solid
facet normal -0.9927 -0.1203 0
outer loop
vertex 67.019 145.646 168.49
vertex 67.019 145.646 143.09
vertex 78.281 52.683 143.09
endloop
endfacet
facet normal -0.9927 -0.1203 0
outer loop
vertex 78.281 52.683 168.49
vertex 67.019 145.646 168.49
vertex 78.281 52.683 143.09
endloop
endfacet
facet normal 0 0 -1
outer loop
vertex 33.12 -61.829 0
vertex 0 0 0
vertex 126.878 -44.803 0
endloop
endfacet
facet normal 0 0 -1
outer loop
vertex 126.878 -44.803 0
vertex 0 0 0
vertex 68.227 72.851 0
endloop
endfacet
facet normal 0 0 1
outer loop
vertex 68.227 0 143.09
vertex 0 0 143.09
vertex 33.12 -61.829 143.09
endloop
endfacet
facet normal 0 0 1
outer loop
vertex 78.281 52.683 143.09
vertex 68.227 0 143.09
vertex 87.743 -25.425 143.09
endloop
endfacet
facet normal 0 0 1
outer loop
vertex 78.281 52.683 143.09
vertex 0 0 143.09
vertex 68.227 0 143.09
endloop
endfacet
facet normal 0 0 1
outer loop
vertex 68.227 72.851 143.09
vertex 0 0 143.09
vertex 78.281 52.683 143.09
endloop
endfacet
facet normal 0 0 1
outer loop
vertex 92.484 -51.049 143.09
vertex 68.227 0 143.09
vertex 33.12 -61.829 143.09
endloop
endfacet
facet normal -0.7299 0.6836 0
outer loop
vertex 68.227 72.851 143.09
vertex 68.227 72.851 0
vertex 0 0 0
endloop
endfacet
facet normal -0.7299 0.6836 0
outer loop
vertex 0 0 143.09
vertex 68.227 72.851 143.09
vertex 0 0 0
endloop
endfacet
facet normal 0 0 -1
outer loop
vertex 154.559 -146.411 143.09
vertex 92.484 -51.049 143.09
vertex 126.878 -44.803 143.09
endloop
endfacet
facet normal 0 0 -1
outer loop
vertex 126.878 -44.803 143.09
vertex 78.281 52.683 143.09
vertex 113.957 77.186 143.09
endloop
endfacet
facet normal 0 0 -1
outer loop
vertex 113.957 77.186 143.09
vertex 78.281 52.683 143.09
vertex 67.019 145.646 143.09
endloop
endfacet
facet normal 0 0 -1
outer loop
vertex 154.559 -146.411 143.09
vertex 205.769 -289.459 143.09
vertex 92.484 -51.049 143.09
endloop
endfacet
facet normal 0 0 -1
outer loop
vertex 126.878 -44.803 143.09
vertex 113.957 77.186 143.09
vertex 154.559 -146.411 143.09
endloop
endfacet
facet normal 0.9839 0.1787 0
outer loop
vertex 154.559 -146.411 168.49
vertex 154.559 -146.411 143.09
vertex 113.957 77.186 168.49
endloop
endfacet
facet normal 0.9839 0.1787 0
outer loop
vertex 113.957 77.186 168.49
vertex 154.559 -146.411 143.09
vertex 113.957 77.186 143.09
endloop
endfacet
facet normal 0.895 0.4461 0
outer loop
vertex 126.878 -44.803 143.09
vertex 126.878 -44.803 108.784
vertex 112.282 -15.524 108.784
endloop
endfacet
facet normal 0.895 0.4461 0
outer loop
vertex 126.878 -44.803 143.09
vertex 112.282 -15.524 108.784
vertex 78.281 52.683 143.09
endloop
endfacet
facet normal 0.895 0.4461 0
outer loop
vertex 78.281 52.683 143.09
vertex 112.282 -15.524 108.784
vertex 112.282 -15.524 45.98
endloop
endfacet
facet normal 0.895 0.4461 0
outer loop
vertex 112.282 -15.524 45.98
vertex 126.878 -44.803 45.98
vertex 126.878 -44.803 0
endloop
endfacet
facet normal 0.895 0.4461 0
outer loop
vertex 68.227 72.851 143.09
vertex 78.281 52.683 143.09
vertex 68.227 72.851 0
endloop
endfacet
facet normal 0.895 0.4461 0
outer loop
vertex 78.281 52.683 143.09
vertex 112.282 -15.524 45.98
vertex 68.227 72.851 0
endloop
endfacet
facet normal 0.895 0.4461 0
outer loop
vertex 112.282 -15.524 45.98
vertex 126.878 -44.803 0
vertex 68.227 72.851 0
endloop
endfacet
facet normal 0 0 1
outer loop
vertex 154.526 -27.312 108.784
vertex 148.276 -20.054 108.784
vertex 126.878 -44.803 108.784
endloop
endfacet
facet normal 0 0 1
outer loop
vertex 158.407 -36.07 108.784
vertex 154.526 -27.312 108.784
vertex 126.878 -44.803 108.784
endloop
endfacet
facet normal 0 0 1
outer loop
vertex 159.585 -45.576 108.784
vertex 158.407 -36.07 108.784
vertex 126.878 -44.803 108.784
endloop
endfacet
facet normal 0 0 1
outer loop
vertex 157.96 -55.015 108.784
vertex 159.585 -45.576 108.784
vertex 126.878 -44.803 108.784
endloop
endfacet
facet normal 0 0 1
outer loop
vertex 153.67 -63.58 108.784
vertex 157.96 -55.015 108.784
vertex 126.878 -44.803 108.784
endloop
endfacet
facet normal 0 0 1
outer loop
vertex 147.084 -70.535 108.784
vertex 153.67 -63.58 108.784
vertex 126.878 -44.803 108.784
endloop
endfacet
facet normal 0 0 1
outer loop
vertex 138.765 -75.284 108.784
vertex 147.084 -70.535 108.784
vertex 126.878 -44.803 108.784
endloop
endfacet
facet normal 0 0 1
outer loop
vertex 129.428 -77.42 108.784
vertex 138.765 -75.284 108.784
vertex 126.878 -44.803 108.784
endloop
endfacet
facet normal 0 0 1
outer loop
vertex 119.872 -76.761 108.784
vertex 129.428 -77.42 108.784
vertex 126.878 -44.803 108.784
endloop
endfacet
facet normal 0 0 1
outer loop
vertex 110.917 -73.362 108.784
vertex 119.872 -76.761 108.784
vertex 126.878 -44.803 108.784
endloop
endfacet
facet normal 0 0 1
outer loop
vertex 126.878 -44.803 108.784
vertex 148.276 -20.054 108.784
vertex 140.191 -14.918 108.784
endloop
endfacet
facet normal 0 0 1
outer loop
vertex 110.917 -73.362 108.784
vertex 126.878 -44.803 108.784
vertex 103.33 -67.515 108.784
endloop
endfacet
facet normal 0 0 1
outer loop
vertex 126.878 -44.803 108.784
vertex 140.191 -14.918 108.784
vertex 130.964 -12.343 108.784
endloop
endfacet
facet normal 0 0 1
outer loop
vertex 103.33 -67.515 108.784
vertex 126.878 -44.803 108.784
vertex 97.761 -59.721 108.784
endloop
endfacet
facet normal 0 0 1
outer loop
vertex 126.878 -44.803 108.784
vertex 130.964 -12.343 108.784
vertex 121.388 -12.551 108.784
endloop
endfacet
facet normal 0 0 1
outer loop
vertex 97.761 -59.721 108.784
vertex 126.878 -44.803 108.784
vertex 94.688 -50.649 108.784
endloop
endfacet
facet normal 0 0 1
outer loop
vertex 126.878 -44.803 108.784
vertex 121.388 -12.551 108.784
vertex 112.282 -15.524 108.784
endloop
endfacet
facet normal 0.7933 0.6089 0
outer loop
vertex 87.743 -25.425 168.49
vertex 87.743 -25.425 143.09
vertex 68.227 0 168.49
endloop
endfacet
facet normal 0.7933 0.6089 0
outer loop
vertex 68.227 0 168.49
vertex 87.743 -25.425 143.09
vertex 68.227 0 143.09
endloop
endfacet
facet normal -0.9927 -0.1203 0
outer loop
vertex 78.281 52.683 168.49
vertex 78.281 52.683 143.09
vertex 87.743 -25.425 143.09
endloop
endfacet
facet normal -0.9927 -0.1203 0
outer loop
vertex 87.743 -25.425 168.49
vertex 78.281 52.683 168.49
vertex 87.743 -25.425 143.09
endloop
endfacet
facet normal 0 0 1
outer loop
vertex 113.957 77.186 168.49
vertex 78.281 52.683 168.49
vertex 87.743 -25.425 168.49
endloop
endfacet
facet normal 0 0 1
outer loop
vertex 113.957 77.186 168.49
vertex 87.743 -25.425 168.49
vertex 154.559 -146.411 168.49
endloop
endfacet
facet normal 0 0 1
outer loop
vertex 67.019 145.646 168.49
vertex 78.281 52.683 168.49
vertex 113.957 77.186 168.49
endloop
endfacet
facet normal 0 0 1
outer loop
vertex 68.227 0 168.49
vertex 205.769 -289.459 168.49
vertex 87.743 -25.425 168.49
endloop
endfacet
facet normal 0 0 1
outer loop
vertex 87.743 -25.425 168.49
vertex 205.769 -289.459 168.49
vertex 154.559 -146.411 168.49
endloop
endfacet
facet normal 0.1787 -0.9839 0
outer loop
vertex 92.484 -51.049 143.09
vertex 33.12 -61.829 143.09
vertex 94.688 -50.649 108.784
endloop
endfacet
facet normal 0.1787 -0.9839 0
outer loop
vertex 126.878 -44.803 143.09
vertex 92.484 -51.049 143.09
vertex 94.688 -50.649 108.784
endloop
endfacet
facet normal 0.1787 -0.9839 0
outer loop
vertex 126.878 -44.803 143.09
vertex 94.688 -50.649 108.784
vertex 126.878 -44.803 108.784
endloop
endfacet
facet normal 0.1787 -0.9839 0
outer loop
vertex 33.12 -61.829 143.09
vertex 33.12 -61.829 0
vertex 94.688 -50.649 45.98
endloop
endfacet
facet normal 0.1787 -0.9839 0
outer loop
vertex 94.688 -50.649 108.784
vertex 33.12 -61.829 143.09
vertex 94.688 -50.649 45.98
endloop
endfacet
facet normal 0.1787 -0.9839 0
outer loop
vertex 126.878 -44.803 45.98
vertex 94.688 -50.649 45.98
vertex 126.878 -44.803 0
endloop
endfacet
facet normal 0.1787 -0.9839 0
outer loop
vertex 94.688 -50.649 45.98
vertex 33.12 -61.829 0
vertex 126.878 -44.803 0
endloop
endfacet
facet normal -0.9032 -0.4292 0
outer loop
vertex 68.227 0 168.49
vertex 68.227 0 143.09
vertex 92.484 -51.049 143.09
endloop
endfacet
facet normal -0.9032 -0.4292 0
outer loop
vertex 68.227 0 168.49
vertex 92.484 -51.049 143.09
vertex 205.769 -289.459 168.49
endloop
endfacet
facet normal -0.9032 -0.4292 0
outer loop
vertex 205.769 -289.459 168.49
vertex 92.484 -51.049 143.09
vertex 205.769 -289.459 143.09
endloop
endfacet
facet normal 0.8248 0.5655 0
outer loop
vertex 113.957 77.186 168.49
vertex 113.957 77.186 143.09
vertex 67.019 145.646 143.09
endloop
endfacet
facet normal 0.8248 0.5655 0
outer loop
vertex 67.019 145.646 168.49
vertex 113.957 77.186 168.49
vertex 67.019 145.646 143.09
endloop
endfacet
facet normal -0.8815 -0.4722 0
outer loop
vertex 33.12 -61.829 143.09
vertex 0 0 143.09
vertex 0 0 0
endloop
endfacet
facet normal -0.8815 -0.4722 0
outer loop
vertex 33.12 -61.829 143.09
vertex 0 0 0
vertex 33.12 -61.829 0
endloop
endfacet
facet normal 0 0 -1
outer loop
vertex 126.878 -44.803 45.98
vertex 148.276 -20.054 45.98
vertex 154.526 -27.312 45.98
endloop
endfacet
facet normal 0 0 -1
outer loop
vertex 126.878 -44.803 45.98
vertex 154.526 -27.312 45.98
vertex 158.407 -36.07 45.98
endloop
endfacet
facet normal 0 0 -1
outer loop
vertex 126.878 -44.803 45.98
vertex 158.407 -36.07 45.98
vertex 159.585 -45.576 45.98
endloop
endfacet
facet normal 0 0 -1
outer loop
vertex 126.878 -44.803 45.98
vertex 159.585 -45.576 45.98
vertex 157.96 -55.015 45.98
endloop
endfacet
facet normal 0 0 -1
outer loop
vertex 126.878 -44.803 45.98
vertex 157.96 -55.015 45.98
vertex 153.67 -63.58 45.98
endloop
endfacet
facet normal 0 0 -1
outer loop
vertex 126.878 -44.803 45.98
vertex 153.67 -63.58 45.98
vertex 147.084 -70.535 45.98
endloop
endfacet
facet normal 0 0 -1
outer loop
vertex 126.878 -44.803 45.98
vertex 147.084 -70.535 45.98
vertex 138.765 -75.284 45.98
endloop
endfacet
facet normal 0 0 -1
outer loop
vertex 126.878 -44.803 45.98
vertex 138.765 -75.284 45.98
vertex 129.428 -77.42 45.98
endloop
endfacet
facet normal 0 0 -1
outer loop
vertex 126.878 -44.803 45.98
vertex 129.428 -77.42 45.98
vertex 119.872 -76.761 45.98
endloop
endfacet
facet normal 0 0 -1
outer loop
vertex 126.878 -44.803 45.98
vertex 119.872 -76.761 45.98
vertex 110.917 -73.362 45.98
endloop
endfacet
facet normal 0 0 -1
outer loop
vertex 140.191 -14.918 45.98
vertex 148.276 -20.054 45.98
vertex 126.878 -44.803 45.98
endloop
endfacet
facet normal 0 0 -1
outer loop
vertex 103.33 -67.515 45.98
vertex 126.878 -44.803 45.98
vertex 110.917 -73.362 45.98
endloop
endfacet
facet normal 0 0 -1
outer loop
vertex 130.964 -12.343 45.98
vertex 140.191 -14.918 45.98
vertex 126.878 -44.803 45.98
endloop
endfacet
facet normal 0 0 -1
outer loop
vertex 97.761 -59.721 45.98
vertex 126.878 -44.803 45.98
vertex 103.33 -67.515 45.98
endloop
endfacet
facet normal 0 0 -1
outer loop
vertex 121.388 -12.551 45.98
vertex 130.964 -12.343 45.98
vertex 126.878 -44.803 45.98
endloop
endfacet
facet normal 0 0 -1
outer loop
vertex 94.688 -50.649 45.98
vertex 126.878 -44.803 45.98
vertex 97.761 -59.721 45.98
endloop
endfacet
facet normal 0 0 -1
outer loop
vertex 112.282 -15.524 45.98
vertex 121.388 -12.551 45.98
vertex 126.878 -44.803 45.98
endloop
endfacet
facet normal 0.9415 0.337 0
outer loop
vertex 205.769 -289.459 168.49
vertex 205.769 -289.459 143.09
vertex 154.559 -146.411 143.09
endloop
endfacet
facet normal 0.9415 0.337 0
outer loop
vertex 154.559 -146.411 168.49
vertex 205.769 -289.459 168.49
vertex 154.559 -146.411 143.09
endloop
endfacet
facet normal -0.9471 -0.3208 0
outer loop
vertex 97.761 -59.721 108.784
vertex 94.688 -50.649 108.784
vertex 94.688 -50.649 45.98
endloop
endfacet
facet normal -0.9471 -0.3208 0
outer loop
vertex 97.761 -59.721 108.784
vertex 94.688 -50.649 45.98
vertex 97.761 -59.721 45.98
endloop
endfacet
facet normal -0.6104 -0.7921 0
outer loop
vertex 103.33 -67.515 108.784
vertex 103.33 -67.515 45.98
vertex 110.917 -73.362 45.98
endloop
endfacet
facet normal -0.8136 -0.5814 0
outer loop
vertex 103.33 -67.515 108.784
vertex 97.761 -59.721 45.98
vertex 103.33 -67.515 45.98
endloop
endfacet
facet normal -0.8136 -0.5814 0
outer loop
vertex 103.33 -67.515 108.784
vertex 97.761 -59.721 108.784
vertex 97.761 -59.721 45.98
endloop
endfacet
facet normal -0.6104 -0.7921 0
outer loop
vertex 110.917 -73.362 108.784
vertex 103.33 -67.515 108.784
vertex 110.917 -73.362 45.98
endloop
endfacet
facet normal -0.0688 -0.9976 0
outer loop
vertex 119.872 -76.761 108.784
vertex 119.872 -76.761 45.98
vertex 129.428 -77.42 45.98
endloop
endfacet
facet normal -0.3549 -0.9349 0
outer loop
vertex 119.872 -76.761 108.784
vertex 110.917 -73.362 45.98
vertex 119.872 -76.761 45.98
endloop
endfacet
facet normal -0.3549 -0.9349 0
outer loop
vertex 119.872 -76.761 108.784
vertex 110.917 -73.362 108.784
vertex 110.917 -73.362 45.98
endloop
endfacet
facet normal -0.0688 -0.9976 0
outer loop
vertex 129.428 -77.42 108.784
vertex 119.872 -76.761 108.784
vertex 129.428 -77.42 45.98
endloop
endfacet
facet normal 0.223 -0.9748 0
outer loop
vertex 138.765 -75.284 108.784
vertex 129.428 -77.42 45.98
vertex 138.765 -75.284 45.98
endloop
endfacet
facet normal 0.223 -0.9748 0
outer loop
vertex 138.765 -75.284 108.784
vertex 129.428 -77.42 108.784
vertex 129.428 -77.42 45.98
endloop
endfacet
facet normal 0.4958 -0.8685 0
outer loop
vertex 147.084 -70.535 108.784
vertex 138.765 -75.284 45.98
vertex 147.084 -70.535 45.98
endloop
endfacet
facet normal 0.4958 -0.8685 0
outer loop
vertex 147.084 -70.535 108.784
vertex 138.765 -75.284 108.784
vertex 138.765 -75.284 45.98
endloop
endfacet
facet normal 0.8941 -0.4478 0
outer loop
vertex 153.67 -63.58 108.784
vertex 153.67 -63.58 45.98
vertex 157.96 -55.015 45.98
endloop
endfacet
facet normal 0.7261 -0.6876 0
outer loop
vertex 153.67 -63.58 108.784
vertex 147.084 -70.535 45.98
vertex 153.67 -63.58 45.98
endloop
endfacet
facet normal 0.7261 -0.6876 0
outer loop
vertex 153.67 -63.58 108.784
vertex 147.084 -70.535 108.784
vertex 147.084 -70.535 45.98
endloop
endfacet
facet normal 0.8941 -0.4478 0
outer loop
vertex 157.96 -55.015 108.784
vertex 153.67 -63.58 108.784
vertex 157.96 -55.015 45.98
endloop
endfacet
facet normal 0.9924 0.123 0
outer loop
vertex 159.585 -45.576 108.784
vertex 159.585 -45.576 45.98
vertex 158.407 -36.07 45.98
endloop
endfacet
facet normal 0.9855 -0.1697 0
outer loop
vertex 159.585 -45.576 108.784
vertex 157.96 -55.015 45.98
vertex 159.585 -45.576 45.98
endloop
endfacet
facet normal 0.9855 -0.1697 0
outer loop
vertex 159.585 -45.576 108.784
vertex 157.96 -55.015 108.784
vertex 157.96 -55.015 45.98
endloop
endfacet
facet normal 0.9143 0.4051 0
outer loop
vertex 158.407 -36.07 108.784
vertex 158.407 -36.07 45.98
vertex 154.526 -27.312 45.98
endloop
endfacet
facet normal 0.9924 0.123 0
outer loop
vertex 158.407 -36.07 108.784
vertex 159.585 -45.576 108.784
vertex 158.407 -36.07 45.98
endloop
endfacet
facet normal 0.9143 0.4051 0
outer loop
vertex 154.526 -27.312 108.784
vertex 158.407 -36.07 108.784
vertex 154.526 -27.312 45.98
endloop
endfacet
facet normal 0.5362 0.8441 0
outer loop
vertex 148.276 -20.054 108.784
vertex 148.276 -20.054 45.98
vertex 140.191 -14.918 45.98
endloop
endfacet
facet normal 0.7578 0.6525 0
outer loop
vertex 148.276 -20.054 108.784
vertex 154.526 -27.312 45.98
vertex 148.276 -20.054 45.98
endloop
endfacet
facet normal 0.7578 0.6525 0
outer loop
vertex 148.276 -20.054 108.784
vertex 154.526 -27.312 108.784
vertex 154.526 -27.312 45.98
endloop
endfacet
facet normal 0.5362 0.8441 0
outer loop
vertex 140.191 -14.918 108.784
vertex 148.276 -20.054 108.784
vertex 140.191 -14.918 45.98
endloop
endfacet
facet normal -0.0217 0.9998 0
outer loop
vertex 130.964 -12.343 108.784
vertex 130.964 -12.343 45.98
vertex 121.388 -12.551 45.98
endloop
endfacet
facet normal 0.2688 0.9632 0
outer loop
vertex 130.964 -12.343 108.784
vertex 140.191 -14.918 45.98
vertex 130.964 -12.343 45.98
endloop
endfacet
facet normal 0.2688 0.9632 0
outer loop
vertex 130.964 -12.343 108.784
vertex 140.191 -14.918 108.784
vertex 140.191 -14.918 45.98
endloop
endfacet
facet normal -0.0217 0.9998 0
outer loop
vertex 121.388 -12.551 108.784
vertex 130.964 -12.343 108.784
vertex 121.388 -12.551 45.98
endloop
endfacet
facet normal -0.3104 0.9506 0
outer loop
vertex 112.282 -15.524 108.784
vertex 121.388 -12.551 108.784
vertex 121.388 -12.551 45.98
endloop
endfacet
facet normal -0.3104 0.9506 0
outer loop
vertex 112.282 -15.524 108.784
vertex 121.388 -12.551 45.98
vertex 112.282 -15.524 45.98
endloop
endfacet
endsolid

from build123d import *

# Parameters (mm, degrees)
F1_DEPTH = 143.0895626545
F2_W     = 32.7163190505
F2_H     = 62.8041177988
F5_DEPTH = 25.4


with BuildPart() as f1:
    # F0 (on Top) → F1 (new body)
    with BuildSketch(Plane.XY):
        Polygon((68.2270601392, 72.8508606553), (0, 0), (33.1200025976, -61.8286803365), (126.8782764673, -44.8034033179), align=None)
    extrude(amount=F1_DEPTH)

    # F2 (on face) → F3 (revolve)
    with BuildSketch(Plane(origin=(11.9261231966, -65.6772118101, 0), x_dir=(0.9839099311, 0.1786651828, 0), z_dir=(0.1786651828, -0.9839099311, 0))):
        with Locations((133.190147536, 77.3819759488)):
            Rectangle(F2_W, F2_H)
    revolve(axis=Axis((126.8782764673, -44.8034033179, 77.3819759488), (0, 0, 1)))

    # F4 (on face) → F5 (join)
    with BuildSketch(Plane.XY.offset(143.0895626545)):
        Polygon((126.8782764673, -44.8034033179), (92.4838976122, -51.0489729484), (205.7687044144, -289.458990097), (154.5593430204, -146.4109615539), (113.9569729567, 77.1864652634), (67.0186877251, 145.6461846828), (78.2807342193, 52.6832034748), align=None)
        Polygon((87.7431482077, -25.424644351), (68.2270601392, 0), (92.4838976122, -51.0489729484), (126.8782764673, -44.8034033179), (78.2807342193, 52.6832034748), align=None)
    extrude(amount=F5_DEPTH)


solid = f1.part
